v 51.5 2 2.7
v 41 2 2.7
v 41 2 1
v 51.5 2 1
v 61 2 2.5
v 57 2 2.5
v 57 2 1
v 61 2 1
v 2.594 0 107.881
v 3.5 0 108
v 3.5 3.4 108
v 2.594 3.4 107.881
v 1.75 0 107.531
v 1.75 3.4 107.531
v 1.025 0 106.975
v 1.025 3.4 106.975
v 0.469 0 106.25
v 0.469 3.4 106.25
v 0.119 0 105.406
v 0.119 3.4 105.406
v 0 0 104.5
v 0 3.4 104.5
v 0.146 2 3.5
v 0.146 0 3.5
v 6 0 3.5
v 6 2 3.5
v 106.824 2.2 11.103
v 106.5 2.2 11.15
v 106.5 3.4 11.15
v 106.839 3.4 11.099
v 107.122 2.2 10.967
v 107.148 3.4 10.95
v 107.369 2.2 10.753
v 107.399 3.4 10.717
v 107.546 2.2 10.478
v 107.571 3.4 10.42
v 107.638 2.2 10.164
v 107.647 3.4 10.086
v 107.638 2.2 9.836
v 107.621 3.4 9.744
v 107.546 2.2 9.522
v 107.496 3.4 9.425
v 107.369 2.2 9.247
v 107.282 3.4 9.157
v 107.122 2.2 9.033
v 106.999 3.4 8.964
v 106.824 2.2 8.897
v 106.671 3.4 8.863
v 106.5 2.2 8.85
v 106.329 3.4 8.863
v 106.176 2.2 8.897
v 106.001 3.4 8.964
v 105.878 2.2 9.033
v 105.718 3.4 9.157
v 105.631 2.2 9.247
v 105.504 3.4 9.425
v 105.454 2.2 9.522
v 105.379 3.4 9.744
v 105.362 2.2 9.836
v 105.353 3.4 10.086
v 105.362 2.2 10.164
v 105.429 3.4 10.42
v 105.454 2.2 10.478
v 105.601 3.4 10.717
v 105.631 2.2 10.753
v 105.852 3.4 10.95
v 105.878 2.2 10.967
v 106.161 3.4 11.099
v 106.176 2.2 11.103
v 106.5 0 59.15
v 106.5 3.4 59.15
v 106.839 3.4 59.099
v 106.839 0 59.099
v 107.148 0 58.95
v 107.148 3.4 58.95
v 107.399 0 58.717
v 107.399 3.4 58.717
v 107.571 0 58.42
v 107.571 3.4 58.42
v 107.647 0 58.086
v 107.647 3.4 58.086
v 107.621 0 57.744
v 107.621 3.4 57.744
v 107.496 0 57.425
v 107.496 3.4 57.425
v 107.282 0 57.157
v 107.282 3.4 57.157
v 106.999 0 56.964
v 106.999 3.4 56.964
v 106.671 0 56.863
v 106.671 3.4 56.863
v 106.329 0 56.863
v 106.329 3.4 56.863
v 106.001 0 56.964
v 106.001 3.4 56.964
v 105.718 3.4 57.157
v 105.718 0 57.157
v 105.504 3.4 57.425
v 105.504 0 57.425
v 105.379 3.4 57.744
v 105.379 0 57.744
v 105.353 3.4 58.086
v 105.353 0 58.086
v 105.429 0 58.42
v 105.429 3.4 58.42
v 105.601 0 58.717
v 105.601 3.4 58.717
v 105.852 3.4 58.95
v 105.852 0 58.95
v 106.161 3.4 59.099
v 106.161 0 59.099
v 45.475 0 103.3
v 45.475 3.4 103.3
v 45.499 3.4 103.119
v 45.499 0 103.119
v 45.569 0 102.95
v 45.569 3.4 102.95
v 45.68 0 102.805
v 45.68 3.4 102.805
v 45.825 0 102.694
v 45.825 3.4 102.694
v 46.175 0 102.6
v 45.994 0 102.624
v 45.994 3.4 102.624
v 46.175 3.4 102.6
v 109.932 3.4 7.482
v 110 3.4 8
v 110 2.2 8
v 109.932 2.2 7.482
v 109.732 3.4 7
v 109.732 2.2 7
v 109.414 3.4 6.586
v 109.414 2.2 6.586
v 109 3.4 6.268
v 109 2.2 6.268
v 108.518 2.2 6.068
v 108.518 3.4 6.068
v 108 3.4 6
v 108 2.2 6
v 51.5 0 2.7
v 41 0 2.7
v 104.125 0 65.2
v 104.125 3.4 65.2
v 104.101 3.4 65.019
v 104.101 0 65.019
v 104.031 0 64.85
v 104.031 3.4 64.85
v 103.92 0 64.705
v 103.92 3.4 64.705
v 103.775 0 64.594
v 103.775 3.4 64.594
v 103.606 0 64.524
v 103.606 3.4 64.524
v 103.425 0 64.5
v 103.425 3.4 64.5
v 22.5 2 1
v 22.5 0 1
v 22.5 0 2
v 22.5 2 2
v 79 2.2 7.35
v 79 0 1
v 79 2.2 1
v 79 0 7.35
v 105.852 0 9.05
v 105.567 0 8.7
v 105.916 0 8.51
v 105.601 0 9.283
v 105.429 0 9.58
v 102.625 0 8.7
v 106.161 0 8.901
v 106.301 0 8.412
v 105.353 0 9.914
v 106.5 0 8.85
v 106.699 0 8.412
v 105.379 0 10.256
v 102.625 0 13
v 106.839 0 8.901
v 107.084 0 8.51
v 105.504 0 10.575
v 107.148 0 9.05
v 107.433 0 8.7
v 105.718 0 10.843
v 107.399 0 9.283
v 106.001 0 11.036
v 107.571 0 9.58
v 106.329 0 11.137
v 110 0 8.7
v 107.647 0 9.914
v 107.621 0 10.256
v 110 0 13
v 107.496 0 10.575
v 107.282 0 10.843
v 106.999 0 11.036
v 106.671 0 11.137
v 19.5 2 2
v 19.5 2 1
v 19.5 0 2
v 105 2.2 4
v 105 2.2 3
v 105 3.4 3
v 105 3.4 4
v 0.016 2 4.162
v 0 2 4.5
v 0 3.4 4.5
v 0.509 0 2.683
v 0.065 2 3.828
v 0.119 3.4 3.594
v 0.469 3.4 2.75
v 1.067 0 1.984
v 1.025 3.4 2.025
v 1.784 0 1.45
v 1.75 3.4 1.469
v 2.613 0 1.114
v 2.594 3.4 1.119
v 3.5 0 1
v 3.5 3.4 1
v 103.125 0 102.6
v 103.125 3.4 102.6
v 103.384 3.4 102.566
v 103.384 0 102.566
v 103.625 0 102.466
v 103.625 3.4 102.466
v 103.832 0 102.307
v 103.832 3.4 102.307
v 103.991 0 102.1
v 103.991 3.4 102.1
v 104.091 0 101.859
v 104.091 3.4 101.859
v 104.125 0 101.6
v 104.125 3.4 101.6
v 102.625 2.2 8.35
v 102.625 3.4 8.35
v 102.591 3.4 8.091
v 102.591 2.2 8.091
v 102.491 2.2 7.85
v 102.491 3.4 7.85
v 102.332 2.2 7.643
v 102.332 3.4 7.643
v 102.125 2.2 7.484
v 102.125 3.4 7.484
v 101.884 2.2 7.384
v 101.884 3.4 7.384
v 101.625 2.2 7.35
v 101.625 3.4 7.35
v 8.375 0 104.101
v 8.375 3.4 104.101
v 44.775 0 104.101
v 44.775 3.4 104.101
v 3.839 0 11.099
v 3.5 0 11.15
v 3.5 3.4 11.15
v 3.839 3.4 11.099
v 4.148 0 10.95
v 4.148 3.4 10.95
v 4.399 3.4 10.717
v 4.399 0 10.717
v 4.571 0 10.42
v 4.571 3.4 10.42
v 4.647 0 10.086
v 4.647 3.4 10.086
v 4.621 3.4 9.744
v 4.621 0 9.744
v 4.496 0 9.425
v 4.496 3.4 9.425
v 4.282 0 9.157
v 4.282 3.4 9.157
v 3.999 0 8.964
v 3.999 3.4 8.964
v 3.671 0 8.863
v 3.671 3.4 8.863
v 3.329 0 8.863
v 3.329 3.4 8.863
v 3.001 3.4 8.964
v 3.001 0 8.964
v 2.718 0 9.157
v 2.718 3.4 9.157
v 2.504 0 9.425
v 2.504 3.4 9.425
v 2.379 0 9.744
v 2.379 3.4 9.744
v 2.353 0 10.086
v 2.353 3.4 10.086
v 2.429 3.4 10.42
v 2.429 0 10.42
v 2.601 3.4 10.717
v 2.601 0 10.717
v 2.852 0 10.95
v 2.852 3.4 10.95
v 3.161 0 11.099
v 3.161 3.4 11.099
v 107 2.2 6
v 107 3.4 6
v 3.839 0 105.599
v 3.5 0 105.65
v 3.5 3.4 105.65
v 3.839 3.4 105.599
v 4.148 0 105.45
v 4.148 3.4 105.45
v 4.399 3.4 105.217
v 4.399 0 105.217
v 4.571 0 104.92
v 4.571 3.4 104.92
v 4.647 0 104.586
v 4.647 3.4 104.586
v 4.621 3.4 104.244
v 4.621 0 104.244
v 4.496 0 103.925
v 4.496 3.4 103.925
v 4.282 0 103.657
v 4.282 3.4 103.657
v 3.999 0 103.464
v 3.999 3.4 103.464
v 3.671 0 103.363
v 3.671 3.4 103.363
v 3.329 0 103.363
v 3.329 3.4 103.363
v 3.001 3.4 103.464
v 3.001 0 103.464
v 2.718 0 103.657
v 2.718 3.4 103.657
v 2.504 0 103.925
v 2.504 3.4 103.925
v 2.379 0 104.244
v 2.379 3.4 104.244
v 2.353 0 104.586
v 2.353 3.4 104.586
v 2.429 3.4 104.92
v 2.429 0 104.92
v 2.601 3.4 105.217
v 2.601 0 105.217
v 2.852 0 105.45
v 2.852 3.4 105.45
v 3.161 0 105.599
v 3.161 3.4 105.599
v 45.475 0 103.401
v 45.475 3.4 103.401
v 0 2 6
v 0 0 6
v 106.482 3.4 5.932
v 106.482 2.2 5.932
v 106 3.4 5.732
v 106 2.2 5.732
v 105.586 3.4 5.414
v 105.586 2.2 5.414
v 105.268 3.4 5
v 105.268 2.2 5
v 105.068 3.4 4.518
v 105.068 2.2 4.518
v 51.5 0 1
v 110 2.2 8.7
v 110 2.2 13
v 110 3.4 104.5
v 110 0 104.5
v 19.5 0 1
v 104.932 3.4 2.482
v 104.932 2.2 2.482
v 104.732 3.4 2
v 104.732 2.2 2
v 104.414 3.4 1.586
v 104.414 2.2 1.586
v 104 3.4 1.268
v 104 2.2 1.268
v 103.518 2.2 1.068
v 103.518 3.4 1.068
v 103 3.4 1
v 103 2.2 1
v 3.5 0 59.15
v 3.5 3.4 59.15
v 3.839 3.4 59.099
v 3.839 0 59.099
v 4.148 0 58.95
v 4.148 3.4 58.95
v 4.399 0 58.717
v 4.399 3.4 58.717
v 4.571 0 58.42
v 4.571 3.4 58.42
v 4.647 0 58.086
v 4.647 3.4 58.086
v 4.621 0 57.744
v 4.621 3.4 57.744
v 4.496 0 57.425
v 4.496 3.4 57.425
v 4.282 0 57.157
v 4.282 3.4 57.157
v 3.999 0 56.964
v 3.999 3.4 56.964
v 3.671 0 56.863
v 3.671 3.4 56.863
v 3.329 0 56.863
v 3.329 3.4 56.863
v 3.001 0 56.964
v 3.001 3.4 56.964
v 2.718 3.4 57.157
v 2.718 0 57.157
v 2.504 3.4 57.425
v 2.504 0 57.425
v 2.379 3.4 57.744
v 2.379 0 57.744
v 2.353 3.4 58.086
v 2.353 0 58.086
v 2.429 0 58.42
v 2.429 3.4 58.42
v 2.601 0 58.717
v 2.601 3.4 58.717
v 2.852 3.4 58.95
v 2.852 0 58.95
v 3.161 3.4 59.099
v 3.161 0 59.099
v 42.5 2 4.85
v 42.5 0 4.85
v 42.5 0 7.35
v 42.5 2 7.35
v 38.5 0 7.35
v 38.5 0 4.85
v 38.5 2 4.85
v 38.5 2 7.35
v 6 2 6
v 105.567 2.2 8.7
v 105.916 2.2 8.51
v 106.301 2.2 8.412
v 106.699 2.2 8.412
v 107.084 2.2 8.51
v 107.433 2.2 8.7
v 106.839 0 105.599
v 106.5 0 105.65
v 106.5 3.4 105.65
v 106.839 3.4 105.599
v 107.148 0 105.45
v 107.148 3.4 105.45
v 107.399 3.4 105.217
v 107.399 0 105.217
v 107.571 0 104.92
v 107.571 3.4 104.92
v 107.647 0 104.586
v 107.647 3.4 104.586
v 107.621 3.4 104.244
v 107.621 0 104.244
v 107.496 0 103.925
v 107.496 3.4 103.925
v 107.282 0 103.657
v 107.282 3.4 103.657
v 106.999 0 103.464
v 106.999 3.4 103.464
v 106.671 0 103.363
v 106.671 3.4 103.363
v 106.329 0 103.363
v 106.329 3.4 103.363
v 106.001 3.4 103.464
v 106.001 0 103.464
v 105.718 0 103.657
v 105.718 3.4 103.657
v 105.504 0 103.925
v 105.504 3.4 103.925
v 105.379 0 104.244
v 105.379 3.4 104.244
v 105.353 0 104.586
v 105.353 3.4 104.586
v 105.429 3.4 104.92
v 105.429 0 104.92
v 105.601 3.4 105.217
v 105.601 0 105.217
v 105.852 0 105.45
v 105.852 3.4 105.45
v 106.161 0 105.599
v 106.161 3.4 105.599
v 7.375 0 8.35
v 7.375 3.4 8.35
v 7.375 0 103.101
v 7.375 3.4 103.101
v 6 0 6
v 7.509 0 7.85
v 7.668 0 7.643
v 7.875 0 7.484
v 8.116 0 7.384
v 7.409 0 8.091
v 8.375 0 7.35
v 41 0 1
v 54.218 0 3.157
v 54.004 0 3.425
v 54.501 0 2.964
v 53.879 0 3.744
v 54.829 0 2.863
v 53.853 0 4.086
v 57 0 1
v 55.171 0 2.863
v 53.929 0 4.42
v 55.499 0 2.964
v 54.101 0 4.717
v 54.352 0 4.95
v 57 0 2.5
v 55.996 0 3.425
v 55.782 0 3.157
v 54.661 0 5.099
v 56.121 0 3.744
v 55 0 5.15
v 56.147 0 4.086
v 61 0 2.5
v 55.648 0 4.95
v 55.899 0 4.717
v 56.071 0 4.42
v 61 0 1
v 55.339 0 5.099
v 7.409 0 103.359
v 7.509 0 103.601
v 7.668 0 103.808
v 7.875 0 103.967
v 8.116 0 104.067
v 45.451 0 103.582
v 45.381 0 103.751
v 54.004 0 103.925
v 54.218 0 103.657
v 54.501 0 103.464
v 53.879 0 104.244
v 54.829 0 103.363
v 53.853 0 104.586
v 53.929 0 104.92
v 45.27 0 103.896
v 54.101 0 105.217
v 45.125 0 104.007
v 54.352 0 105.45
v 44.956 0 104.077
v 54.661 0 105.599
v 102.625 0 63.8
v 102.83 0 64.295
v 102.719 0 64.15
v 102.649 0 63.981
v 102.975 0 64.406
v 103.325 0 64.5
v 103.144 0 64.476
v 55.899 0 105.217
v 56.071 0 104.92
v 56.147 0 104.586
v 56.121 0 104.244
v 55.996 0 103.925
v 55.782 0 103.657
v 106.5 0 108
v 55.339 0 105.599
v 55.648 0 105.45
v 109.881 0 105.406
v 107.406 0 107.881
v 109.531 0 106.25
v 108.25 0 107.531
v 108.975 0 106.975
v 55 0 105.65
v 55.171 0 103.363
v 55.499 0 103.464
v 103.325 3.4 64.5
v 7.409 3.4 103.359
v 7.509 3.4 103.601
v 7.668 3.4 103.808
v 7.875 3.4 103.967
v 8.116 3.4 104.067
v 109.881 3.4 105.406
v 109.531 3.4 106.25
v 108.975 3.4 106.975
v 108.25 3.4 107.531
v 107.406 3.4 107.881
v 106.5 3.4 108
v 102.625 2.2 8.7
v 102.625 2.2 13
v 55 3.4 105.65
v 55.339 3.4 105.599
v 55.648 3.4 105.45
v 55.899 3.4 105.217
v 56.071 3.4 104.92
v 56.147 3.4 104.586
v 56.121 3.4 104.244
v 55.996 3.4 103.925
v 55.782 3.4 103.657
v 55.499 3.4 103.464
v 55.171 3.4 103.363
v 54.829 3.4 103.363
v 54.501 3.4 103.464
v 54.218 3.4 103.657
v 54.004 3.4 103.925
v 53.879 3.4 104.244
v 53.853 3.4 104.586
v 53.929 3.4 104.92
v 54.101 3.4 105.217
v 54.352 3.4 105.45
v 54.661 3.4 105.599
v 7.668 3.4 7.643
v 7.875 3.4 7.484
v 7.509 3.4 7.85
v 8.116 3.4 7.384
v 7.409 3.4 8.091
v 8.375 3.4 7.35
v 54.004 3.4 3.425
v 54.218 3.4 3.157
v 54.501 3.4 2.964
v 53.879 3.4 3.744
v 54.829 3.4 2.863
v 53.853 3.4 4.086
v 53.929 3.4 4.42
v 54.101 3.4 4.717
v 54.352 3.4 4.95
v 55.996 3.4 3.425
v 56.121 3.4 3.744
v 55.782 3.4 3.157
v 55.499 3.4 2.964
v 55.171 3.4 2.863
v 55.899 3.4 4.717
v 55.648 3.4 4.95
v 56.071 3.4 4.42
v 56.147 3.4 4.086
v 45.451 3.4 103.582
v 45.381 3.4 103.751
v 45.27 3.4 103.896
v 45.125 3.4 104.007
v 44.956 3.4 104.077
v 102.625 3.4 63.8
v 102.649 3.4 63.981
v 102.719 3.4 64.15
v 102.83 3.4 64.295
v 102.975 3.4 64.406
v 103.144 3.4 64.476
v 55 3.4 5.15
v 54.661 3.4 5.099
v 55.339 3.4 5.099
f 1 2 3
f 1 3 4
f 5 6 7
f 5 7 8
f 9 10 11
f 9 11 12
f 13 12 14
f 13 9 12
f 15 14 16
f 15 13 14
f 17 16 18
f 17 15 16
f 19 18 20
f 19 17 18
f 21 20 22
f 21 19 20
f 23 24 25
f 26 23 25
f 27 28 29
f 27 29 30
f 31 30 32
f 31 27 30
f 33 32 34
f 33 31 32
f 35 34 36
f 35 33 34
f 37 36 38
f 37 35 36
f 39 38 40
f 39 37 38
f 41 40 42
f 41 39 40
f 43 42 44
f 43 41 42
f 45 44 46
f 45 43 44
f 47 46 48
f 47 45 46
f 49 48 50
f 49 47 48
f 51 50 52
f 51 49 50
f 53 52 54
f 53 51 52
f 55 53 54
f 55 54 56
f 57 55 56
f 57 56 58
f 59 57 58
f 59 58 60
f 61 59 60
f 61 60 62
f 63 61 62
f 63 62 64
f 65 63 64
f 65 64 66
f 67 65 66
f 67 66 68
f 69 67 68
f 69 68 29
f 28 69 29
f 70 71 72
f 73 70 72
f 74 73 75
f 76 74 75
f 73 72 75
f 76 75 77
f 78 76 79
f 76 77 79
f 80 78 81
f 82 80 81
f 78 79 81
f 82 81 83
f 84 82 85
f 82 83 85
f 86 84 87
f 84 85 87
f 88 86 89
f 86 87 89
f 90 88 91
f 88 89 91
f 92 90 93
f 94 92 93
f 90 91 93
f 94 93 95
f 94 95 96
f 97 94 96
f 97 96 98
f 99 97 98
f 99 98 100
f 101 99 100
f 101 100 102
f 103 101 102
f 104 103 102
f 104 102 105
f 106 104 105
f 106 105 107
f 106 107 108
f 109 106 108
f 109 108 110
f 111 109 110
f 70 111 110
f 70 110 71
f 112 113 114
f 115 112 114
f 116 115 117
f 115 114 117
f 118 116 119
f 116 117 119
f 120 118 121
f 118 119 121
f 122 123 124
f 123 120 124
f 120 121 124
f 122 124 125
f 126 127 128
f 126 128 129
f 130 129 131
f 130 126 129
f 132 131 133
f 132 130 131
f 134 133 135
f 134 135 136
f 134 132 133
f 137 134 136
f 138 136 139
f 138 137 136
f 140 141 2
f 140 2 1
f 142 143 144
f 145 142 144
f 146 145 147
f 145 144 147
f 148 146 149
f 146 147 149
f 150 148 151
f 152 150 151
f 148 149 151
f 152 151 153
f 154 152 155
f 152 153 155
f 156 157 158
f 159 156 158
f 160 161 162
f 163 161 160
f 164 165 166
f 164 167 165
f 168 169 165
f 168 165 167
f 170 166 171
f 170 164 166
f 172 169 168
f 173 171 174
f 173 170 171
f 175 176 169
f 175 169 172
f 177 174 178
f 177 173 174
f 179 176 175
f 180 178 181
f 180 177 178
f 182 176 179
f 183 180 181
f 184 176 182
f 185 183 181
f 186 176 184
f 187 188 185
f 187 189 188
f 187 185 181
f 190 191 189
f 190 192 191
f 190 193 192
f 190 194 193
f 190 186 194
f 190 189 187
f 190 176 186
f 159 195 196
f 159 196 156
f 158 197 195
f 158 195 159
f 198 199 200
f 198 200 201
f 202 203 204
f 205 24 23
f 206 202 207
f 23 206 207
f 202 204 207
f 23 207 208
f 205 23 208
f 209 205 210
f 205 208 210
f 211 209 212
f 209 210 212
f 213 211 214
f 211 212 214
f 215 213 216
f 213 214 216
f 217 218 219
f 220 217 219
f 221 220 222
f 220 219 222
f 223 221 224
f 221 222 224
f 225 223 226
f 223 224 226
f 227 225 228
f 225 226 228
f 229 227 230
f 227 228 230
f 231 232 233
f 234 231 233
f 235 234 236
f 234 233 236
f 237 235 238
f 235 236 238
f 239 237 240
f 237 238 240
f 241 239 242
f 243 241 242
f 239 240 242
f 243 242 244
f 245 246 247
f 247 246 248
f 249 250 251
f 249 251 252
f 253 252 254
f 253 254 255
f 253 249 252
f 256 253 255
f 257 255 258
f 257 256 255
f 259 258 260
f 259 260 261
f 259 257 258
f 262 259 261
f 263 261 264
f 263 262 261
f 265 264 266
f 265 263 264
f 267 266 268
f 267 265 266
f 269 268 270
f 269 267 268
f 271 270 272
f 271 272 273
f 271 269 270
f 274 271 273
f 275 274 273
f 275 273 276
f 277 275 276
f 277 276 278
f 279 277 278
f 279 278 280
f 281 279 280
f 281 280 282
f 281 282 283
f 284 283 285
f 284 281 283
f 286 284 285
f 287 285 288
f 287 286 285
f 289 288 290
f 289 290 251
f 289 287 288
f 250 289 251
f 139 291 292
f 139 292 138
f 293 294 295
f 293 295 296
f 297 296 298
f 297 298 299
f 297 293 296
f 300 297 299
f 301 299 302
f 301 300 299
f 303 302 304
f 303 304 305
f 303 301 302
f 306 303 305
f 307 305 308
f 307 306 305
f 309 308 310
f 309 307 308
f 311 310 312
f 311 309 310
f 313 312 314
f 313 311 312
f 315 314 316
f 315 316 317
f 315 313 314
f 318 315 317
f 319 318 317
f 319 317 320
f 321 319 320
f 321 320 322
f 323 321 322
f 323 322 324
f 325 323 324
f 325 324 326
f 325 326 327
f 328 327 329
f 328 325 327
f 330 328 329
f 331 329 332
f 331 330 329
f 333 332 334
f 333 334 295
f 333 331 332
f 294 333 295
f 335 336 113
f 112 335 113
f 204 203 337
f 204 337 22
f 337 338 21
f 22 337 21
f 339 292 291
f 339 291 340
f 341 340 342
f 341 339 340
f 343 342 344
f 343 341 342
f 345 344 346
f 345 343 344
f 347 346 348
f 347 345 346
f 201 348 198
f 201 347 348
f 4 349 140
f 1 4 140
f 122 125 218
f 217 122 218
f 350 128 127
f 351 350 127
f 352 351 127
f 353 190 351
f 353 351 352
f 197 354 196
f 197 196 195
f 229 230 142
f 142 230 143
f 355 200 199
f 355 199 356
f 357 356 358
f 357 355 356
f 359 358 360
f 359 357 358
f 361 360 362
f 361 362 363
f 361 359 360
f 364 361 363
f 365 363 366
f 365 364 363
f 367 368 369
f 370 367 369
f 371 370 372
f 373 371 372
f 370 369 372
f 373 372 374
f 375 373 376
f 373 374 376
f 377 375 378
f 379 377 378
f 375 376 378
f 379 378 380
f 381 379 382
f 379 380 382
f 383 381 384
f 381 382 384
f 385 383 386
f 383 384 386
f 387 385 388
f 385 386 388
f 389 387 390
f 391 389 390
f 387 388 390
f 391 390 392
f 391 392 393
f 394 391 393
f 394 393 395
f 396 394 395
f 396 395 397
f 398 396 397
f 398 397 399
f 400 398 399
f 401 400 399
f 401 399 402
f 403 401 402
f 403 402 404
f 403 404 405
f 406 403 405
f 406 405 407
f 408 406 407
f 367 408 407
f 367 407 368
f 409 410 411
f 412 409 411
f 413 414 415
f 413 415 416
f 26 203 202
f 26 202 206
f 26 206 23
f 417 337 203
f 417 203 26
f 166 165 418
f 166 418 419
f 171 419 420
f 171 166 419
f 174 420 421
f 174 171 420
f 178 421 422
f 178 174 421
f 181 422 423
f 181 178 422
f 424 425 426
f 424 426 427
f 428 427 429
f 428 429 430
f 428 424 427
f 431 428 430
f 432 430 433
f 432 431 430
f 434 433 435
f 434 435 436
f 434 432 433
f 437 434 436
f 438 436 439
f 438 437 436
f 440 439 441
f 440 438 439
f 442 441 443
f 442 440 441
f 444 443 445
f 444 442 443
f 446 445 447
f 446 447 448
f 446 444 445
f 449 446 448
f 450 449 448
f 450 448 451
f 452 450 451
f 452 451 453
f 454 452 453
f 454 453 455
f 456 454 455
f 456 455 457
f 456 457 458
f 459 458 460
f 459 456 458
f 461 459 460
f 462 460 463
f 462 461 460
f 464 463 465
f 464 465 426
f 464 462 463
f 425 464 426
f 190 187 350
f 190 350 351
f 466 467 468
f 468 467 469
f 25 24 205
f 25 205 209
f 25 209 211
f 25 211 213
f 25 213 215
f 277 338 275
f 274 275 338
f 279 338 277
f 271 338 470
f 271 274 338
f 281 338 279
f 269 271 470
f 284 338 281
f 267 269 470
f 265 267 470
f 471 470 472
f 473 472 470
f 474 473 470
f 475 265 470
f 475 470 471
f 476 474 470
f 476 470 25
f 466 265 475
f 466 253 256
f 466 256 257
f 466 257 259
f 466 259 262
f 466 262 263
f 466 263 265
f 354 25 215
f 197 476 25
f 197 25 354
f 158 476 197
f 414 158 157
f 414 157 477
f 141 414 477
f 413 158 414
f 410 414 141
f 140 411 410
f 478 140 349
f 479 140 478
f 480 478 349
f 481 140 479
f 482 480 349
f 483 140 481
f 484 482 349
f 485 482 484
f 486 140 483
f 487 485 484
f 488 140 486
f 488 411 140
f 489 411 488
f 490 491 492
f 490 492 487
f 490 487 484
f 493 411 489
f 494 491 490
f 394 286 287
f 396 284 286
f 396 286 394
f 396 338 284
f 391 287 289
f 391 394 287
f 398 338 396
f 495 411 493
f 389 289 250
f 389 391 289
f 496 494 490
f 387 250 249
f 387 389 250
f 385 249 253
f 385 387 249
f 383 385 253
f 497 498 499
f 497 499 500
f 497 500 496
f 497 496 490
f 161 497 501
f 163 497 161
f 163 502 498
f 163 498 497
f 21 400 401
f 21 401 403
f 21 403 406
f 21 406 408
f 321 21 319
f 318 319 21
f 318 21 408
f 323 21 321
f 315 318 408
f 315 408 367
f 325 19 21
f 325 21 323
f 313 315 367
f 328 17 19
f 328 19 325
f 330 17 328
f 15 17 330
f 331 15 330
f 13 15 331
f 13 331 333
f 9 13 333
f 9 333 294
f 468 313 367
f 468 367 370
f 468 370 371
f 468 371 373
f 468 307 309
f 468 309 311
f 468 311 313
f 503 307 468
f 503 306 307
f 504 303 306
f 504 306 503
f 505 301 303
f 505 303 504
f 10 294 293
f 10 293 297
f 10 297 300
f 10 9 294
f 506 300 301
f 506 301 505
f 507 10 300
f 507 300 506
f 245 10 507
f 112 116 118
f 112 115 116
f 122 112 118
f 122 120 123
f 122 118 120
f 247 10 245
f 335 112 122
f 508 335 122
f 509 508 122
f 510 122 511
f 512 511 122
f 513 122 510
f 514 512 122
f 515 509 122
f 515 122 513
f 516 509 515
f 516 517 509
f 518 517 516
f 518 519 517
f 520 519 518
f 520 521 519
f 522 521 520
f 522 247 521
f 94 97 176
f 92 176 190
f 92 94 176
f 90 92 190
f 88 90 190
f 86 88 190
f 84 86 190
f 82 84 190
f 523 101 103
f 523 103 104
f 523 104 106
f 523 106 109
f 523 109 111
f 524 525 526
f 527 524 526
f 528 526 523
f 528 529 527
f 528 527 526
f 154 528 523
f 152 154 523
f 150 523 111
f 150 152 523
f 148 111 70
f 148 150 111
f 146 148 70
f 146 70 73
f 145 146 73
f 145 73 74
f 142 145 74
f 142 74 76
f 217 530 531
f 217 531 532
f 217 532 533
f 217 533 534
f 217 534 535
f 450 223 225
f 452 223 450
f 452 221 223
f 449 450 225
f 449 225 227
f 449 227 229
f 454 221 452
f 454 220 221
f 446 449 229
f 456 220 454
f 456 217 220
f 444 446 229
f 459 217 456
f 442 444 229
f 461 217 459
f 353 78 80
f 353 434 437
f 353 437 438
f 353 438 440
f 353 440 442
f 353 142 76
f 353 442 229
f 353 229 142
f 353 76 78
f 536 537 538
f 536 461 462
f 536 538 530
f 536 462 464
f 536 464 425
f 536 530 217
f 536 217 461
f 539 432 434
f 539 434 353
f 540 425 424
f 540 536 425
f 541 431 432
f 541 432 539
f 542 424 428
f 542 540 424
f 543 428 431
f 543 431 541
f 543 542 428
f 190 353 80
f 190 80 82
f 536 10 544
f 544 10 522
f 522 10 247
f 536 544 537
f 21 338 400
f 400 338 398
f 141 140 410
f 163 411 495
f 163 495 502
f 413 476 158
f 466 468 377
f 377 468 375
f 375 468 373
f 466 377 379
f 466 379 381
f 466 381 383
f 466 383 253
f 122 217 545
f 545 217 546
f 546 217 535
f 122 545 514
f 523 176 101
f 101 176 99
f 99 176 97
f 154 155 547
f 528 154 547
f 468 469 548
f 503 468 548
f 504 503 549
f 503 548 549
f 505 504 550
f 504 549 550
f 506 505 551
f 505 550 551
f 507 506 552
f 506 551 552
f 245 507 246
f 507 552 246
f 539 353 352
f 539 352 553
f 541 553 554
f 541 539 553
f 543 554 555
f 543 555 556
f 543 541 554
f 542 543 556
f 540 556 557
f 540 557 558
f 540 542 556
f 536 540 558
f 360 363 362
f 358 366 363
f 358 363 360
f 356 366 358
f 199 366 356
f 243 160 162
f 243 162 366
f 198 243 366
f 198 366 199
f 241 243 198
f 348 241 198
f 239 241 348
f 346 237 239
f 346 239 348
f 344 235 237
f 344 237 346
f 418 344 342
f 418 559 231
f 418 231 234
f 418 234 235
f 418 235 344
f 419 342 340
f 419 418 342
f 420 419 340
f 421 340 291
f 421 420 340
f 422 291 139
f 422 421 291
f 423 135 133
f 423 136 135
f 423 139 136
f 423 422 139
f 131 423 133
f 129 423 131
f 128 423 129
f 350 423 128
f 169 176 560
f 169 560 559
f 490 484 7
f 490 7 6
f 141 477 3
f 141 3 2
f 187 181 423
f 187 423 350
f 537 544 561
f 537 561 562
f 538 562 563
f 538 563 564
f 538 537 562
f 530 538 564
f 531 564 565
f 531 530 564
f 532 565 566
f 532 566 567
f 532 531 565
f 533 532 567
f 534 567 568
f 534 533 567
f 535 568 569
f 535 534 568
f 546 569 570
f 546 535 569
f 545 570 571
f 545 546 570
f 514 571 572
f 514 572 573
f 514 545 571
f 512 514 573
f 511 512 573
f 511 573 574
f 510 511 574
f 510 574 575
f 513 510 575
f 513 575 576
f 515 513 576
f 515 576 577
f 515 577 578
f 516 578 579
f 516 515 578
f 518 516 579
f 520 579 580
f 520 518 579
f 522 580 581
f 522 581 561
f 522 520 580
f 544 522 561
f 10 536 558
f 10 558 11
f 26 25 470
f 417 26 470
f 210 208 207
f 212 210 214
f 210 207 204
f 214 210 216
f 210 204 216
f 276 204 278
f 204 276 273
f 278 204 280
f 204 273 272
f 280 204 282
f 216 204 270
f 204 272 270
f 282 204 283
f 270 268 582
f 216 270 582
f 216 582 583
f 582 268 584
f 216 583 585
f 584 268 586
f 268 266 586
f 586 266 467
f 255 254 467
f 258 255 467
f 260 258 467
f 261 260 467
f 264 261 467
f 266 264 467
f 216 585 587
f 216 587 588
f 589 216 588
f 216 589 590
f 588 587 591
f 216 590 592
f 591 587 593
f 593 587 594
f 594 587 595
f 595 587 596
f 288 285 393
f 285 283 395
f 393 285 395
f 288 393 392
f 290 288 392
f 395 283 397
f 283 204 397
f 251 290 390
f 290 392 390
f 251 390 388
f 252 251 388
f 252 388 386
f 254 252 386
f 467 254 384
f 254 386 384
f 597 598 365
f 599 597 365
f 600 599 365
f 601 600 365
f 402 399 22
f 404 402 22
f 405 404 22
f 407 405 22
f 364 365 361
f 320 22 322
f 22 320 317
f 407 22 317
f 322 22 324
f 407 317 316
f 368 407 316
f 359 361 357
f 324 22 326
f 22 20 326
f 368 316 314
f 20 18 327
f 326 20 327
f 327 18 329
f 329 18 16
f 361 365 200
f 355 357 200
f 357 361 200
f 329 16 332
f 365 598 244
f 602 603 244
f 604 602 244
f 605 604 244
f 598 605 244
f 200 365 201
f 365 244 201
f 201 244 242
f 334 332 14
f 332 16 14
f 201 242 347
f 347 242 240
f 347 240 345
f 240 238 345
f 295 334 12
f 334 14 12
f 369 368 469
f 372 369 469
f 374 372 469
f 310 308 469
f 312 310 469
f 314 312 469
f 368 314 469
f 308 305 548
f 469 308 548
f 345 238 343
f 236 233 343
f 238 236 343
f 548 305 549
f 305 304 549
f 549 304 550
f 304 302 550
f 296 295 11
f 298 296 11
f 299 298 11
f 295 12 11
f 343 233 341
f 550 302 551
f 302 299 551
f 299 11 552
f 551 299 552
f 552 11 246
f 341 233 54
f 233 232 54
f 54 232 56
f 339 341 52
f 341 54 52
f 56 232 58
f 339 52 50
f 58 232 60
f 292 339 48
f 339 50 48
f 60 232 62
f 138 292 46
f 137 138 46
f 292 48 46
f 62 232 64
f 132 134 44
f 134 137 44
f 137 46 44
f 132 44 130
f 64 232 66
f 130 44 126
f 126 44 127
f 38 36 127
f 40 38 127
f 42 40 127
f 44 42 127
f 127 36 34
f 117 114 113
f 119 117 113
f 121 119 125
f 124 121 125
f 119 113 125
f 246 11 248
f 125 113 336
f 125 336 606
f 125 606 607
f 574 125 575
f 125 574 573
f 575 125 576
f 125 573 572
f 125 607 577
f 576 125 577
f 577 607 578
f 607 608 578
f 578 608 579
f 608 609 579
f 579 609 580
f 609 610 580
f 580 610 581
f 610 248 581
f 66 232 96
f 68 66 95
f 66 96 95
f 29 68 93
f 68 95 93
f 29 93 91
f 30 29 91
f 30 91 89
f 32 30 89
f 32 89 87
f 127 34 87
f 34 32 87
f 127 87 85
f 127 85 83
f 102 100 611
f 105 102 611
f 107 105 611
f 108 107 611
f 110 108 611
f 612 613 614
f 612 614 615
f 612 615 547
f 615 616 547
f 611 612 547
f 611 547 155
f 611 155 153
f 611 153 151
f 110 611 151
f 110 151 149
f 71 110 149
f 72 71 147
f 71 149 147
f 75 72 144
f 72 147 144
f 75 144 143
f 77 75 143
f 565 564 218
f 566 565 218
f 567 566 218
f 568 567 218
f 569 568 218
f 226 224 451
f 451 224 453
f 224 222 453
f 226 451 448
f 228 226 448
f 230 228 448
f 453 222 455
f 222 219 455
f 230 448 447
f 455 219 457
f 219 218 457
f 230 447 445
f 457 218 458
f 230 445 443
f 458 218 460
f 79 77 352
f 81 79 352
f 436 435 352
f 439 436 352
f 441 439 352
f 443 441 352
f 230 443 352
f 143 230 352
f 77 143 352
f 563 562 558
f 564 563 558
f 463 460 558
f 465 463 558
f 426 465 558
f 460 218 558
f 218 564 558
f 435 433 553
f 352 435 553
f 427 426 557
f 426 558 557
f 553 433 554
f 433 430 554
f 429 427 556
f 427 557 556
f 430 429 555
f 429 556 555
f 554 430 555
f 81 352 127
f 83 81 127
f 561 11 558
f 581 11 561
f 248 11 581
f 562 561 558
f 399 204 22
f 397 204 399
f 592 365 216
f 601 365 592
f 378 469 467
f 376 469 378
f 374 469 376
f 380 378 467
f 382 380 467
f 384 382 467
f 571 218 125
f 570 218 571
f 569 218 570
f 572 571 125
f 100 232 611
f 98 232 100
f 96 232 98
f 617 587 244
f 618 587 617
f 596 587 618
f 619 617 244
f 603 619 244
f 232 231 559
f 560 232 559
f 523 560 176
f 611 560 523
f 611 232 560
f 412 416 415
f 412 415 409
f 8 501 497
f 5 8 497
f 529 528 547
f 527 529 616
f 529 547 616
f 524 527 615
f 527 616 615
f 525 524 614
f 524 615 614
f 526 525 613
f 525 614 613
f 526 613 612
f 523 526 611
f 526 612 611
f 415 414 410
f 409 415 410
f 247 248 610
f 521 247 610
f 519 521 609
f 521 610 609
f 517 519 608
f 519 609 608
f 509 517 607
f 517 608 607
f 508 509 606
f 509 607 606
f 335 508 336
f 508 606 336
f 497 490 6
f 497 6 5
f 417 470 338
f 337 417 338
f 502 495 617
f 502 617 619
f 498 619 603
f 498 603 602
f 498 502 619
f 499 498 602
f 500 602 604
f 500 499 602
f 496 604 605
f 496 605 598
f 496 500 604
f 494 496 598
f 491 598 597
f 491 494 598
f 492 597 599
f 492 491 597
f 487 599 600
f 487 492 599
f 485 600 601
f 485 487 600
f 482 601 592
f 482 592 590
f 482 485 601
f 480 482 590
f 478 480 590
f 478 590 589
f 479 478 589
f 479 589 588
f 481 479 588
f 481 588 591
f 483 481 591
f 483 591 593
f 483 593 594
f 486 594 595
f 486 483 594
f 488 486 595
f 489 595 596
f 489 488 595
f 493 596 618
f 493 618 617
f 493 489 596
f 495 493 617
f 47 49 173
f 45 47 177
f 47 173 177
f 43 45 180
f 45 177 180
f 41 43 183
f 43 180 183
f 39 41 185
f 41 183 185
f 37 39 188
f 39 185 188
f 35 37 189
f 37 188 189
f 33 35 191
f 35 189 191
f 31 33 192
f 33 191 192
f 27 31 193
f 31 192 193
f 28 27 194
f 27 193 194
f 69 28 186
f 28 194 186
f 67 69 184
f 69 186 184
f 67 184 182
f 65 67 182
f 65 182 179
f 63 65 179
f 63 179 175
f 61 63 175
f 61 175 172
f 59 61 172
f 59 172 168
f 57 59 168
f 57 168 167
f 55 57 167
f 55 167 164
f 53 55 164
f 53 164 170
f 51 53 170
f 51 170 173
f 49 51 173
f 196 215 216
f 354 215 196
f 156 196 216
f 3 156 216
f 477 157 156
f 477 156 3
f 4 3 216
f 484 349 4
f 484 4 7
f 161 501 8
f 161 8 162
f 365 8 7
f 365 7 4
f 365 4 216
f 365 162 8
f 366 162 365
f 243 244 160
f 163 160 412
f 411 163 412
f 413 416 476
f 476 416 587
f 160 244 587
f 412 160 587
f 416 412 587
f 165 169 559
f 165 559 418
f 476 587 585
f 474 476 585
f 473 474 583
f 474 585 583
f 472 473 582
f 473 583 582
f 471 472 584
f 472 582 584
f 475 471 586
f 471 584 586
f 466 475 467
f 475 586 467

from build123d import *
from build123d.topology import SkipClean

# Parameters (mm, degrees)
SKETCH_2_R           = 1.15
EXTRUDE_1_DEPTH      = 3.4
CUT_EXTRUDE_4_DEPTH  = 155.193255365
SKETCH_5_W           = 10.5
SKETCH_5_H           = 2.7
SKETCH_5_W_2         = 4
SKETCH_5_H_2         = 2.5
SKETCH_5_W_3         = 3
SKETCH_5_H_3         = 2
CUT_EXTRUDE_8_DEPTH  = 2
SKETCH_6_W           = 1
SKETCH_6_H           = 1
CUT_EXTRUDE_9_DEPTH  = 2
SKETCH_7_W           = 0.375
SKETCH_7_H           = 4.5
EXTRUDE_2_DEPTH      = 2
SKETCH_8_W           = 110
SKETCH_8_H           = 3.4
CUT_EXTRUDE_10_DEPTH = 1
SKETCH_9_W           = 6
SKETCH_9_H           = 2.5
SKETCH_9_W_2         = 6.621572964
EXTRUDE_3_DEPTH      = 3.4
FILLET_1_R           = 3.5
SKETCH_10_W          = 5
SKETCH_10_H          = 5
CUT_EXTRUDE_11_DEPTH = 155.193255365
FILLET_4_R           = 2
FILLET_5_R           = 2
SKETCH_11_R          = 1.15
CUT_EXTRUDE_12_DEPTH = 11
SKETCH_12_W          = 23.625
SKETCH_12_H          = 7.35
CUT_EXTRUDE_14_DEPTH = 2
SKETCH_14_W          = 31
SKETCH_14_H          = 12
CUT_EXTRUDE_15_DEPTH = 2.2
EXTRUDE_START        = 2.2
SKETCH_15_R          = 1.15
EXTRUDE_8_DEPTH      = 2.2


with BuildPart() as part:
    # 스케치2 → 보스-돌출1 (new body)
    with BuildSketch(Plane(origin=(0, 0, 0), x_dir=(1, 0, 0), z_dir=(0, 1, 0))):
        with BuildLine():
            Line((3.5, 0), (106.5, 0))
            ThreePointArc((106.5, 0), (108.974873734, -1.025126266), (110, -3.5))
            Line((110, -3.5), (110, -104.5))
            ThreePointArc((110, -104.5), (108.974873734, -106.974873734), (106.5, -108))
            Line((106.5, -108), (3.5, -108))
            ThreePointArc((3.5, -108), (1.025126266, -106.974873734), (0, -104.5))
            Line((0, -104.5), (0, -3.5))
            ThreePointArc((0, -3.5), (1.025126266, -1.025126266), (3.5, 0))
        make_face()
        with Locations(Location((3.5, -104.5, 0), (0, 0, 270))):
            Circle(SKETCH_2_R, mode=Mode.SUBTRACT)
        with Locations(Location((106.5, -10, 0), (0, 0, 270))):
            Circle(SKETCH_2_R, mode=Mode.SUBTRACT)
        with Locations(Location((106.5, -104.5, 0), (0, 0, 270))):
            Circle(SKETCH_2_R, mode=Mode.SUBTRACT)
        with Locations(Location((55, -104.5, 0), (0, 0, 270))):
            Circle(SKETCH_2_R, mode=Mode.SUBTRACT)
        with Locations(Location((3.5, -10, 0), (0, 0, 270))):
            Circle(SKETCH_2_R, mode=Mode.SUBTRACT)
        with Locations(Location((55, -4, 0), (0, 0, 270))):
            Circle(SKETCH_2_R, mode=Mode.SUBTRACT)
    extrude(amount=EXTRUDE_1_DEPTH)

    # 스케치3 → 컷-돌출4 (cut, through all)
    with BuildSketch(Plane(origin=(0, 3.4, 0), x_dir=(1, 0, 0), z_dir=(0, 1, 0))):
        with BuildLine():
            Line((7.375, -8.35), (7.375, -103.100597342))
            ThreePointArc((7.375, -103.100597342), (7.667893219, -103.807704123), (8.375, -104.100597342))
            Line((8.375, -104.100597342), (44.775, -104.100597342))
            ThreePointArc((44.775, -104.100597342), (45.269974747, -103.895572089), (45.475, -103.400597342))
            Line((45.475, -103.400597342), (45.475, -103.3))
            ThreePointArc((45.475, -103.3), (45.680025253, -102.805025253), (46.175, -102.6))
            Line((46.175, -102.6), (102.625, -102.6))
            Line((102.625, -102.6), (103.125, -102.6))
            ThreePointArc((103.125, -102.6), (103.832106781, -102.307106781), (104.125, -101.6))
            Line((104.125, -101.6), (104.125, -65.2))
            ThreePointArc((104.125, -65.2), (103.919974747, -64.705025253), (103.425, -64.5))
            Line((103.425, -64.5), (103.325, -64.5))
            ThreePointArc((103.325, -64.5), (102.830025253, -64.294974747), (102.625, -63.8))
            Line((102.625, -63.8), (102.625, -8.35))
            ThreePointArc((102.625, -8.35), (102.332106781, -7.642893219), (101.625, -7.35))
            Line((101.625, -7.35), (8.375, -7.35))
            ThreePointArc((8.375, -7.35), (7.667893219, -7.642893219), (7.375, -8.35))
        make_face()
    extrude(amount=-CUT_EXTRUDE_4_DEPTH, mode=Mode.SUBTRACT)

    # 스케치5 → 컷-돌출8 (cut)
    with BuildSketch(Plane.XZ):
        Polygon((101.625, 7.35), (97, 7.35), (97, 2.85), (103, 2.85), (103, 7.35), (102.625, 7.35), align=None)
        with BuildLine():
            Line((97, 8.636748981), (97, 7.35))
            Line((97, 7.35), (101.625, 7.35))
            ThreePointArc((101.625, 7.35), (102.332106781, 7.642893219), (102.625, 8.35))
            Line((102.625, 8.35), (102.625, 8.636748981))
            Line((102.625, 8.636748981), (97, 8.636748981))
        make_face()
        with BuildLine():
            ThreePointArc((0, 3.5), (1.025126266, 1.025126266), (3.5, 0))
            Line((3.5, 0), (6, 0))
            Line((6, 0), (6, 6))
            Line((6, 6), (0, 6))
            Line((0, 6), (0, 3.5))
        make_face()
        with Locations((46.25, 1.35)):
            Rectangle(SKETCH_5_W, SKETCH_5_H)
        with Locations((40.5, 6.1)):
            Rectangle(SKETCH_5_W_2, SKETCH_5_H_2)
        with Locations((21, 1)):
            Rectangle(SKETCH_5_W_3, SKETCH_5_H_3)
        with Locations((59, 1.25)):
            Rectangle(SKETCH_5_W_2, SKETCH_5_H_2)
        with Locations((80.5, 1)):
            Rectangle(SKETCH_5_W_3, SKETCH_5_H_3)
    extrude(amount=-CUT_EXTRUDE_8_DEPTH, mode=Mode.SUBTRACT)

    # 스케치6 → 컷-돌출9 (cut)
    with BuildSketch(Plane.XZ):
        with Locations((102.125, 7.85)):
            Rectangle(SKETCH_6_W, SKETCH_6_H)
    extrude(amount=-CUT_EXTRUDE_9_DEPTH, mode=Mode.SUBTRACT)

    # 스케치7 → 보스-돌출2 (add)
    with BuildSketch(Plane.XZ.offset(-2)):
        with Locations((102.8125, 5.1)):
            Rectangle(SKETCH_7_W, SKETCH_7_H)
    extrude(amount=EXTRUDE_2_DEPTH)

    # 스케치8 → 컷-돌출10 (cut)
    with BuildSketch(Plane(origin=(0, 0, 0), x_dir=(-1, 0, 0), z_dir=(0, 0, -1))):
        with Locations((-55, 1.7)):
            Rectangle(SKETCH_8_W, SKETCH_8_H)
    extrude(amount=-CUT_EXTRUDE_10_DEPTH, mode=Mode.SUBTRACT)

    # 스케치9 → 보스-돌출3 (add, through all)
    with BuildSketch(Plane.XZ):
        with Locations((3, 2.25)):
            Rectangle(SKETCH_9_W, SKETCH_9_H)
        with Locations((106.689213518, 2.25)):
            Rectangle(SKETCH_9_W_2, SKETCH_9_H)
    extrude(amount=-EXTRUDE_3_DEPTH)

    # 필렛1
    fillet_1_edges = [part.edges().sort_by_distance(p)[0] for p in [
        (0, 1.7, 1),
        (110, 1.7, 1),
    ]]
    fillet(fillet_1_edges, radius=FILLET_1_R)

    # 스케치10 → 컷-돌출11 (cut, through all)
    with BuildSketch(Plane.XZ):
        with Locations((107.5, 3.5)):
            Rectangle(SKETCH_10_W, SKETCH_10_H)
    extrude(amount=-CUT_EXTRUDE_11_DEPTH, mode=Mode.SUBTRACT)

    # 필렛4
    fillet_4_edges = [part.edges().sort_by_distance(p)[0] for p in [
        (110, 1.7, 6),
        (105, 1.7, 1),
    ]]
    fillet(fillet_4_edges, radius=FILLET_4_R)

    # 필렛5
    fillet_5_edges = [part.edges().sort_by_distance(p)[0] for p in [
        (105, 1.7, 6),
    ]]
    fillet(fillet_5_edges, radius=FILLET_5_R)

    # 스케치11 → 컷-돌출12 (cut)
    with BuildSketch(Plane(origin=(0, 3.4, 0), x_dir=(1, 0, 0), z_dir=(0, 1, 0))):
        with Locations(Location((3.5, -58, 0), (0, 0, 270))):
            Circle(SKETCH_11_R)
        with Locations(Location((106.5, -58, 0), (0, 0, 270))):
            Circle(SKETCH_11_R)
    extrude(amount=-CUT_EXTRUDE_12_DEPTH, mode=Mode.SUBTRACT)

    # 스케치12 → 컷-돌출14 (cut)
    with BuildSketch(Plane.XZ):
        with Locations((90.8125, 4.675)):
            Rectangle(SKETCH_12_W, SKETCH_12_H)
    extrude(amount=-CUT_EXTRUDE_14_DEPTH, mode=Mode.SUBTRACT)

    # 스케치14 → 컷-돌출15 (cut)
    with BuildSketch(Plane.XZ):
        with Locations((94.5, 7)):
            Rectangle(SKETCH_14_W, SKETCH_14_H)
    extrude(amount=-CUT_EXTRUDE_15_DEPTH, mode=Mode.SUBTRACT)

    # 스케치15 → 보스-돌출8 (add)
    with SkipClean():  # the faces are left unmerged after this step: merging them gives an invalid solid
        with BuildSketch(Plane.XZ.offset(-2.2).offset(EXTRUDE_START)):
            with BuildLine():
                Line((110, 13), (102.625, 13))
                Line((102.625, 13), (102.625, 8.7))
                Line((102.625, 8.7), (105.567262095, 8.7))
                ThreePointArc((105.567262095, 8.7), (106.5, 8.4), (107.432737905, 8.7))
                Line((107.432737905, 8.7), (110, 8.7))
                Line((110, 8.7), (110, 13))
            make_face()
            with Locations(Location((106.5, 10, 0), (0, 0, 270))):
                Circle(SKETCH_15_R, mode=Mode.SUBTRACT)
        extrude(amount=-EXTRUDE_8_DEPTH)


solid = part.part
